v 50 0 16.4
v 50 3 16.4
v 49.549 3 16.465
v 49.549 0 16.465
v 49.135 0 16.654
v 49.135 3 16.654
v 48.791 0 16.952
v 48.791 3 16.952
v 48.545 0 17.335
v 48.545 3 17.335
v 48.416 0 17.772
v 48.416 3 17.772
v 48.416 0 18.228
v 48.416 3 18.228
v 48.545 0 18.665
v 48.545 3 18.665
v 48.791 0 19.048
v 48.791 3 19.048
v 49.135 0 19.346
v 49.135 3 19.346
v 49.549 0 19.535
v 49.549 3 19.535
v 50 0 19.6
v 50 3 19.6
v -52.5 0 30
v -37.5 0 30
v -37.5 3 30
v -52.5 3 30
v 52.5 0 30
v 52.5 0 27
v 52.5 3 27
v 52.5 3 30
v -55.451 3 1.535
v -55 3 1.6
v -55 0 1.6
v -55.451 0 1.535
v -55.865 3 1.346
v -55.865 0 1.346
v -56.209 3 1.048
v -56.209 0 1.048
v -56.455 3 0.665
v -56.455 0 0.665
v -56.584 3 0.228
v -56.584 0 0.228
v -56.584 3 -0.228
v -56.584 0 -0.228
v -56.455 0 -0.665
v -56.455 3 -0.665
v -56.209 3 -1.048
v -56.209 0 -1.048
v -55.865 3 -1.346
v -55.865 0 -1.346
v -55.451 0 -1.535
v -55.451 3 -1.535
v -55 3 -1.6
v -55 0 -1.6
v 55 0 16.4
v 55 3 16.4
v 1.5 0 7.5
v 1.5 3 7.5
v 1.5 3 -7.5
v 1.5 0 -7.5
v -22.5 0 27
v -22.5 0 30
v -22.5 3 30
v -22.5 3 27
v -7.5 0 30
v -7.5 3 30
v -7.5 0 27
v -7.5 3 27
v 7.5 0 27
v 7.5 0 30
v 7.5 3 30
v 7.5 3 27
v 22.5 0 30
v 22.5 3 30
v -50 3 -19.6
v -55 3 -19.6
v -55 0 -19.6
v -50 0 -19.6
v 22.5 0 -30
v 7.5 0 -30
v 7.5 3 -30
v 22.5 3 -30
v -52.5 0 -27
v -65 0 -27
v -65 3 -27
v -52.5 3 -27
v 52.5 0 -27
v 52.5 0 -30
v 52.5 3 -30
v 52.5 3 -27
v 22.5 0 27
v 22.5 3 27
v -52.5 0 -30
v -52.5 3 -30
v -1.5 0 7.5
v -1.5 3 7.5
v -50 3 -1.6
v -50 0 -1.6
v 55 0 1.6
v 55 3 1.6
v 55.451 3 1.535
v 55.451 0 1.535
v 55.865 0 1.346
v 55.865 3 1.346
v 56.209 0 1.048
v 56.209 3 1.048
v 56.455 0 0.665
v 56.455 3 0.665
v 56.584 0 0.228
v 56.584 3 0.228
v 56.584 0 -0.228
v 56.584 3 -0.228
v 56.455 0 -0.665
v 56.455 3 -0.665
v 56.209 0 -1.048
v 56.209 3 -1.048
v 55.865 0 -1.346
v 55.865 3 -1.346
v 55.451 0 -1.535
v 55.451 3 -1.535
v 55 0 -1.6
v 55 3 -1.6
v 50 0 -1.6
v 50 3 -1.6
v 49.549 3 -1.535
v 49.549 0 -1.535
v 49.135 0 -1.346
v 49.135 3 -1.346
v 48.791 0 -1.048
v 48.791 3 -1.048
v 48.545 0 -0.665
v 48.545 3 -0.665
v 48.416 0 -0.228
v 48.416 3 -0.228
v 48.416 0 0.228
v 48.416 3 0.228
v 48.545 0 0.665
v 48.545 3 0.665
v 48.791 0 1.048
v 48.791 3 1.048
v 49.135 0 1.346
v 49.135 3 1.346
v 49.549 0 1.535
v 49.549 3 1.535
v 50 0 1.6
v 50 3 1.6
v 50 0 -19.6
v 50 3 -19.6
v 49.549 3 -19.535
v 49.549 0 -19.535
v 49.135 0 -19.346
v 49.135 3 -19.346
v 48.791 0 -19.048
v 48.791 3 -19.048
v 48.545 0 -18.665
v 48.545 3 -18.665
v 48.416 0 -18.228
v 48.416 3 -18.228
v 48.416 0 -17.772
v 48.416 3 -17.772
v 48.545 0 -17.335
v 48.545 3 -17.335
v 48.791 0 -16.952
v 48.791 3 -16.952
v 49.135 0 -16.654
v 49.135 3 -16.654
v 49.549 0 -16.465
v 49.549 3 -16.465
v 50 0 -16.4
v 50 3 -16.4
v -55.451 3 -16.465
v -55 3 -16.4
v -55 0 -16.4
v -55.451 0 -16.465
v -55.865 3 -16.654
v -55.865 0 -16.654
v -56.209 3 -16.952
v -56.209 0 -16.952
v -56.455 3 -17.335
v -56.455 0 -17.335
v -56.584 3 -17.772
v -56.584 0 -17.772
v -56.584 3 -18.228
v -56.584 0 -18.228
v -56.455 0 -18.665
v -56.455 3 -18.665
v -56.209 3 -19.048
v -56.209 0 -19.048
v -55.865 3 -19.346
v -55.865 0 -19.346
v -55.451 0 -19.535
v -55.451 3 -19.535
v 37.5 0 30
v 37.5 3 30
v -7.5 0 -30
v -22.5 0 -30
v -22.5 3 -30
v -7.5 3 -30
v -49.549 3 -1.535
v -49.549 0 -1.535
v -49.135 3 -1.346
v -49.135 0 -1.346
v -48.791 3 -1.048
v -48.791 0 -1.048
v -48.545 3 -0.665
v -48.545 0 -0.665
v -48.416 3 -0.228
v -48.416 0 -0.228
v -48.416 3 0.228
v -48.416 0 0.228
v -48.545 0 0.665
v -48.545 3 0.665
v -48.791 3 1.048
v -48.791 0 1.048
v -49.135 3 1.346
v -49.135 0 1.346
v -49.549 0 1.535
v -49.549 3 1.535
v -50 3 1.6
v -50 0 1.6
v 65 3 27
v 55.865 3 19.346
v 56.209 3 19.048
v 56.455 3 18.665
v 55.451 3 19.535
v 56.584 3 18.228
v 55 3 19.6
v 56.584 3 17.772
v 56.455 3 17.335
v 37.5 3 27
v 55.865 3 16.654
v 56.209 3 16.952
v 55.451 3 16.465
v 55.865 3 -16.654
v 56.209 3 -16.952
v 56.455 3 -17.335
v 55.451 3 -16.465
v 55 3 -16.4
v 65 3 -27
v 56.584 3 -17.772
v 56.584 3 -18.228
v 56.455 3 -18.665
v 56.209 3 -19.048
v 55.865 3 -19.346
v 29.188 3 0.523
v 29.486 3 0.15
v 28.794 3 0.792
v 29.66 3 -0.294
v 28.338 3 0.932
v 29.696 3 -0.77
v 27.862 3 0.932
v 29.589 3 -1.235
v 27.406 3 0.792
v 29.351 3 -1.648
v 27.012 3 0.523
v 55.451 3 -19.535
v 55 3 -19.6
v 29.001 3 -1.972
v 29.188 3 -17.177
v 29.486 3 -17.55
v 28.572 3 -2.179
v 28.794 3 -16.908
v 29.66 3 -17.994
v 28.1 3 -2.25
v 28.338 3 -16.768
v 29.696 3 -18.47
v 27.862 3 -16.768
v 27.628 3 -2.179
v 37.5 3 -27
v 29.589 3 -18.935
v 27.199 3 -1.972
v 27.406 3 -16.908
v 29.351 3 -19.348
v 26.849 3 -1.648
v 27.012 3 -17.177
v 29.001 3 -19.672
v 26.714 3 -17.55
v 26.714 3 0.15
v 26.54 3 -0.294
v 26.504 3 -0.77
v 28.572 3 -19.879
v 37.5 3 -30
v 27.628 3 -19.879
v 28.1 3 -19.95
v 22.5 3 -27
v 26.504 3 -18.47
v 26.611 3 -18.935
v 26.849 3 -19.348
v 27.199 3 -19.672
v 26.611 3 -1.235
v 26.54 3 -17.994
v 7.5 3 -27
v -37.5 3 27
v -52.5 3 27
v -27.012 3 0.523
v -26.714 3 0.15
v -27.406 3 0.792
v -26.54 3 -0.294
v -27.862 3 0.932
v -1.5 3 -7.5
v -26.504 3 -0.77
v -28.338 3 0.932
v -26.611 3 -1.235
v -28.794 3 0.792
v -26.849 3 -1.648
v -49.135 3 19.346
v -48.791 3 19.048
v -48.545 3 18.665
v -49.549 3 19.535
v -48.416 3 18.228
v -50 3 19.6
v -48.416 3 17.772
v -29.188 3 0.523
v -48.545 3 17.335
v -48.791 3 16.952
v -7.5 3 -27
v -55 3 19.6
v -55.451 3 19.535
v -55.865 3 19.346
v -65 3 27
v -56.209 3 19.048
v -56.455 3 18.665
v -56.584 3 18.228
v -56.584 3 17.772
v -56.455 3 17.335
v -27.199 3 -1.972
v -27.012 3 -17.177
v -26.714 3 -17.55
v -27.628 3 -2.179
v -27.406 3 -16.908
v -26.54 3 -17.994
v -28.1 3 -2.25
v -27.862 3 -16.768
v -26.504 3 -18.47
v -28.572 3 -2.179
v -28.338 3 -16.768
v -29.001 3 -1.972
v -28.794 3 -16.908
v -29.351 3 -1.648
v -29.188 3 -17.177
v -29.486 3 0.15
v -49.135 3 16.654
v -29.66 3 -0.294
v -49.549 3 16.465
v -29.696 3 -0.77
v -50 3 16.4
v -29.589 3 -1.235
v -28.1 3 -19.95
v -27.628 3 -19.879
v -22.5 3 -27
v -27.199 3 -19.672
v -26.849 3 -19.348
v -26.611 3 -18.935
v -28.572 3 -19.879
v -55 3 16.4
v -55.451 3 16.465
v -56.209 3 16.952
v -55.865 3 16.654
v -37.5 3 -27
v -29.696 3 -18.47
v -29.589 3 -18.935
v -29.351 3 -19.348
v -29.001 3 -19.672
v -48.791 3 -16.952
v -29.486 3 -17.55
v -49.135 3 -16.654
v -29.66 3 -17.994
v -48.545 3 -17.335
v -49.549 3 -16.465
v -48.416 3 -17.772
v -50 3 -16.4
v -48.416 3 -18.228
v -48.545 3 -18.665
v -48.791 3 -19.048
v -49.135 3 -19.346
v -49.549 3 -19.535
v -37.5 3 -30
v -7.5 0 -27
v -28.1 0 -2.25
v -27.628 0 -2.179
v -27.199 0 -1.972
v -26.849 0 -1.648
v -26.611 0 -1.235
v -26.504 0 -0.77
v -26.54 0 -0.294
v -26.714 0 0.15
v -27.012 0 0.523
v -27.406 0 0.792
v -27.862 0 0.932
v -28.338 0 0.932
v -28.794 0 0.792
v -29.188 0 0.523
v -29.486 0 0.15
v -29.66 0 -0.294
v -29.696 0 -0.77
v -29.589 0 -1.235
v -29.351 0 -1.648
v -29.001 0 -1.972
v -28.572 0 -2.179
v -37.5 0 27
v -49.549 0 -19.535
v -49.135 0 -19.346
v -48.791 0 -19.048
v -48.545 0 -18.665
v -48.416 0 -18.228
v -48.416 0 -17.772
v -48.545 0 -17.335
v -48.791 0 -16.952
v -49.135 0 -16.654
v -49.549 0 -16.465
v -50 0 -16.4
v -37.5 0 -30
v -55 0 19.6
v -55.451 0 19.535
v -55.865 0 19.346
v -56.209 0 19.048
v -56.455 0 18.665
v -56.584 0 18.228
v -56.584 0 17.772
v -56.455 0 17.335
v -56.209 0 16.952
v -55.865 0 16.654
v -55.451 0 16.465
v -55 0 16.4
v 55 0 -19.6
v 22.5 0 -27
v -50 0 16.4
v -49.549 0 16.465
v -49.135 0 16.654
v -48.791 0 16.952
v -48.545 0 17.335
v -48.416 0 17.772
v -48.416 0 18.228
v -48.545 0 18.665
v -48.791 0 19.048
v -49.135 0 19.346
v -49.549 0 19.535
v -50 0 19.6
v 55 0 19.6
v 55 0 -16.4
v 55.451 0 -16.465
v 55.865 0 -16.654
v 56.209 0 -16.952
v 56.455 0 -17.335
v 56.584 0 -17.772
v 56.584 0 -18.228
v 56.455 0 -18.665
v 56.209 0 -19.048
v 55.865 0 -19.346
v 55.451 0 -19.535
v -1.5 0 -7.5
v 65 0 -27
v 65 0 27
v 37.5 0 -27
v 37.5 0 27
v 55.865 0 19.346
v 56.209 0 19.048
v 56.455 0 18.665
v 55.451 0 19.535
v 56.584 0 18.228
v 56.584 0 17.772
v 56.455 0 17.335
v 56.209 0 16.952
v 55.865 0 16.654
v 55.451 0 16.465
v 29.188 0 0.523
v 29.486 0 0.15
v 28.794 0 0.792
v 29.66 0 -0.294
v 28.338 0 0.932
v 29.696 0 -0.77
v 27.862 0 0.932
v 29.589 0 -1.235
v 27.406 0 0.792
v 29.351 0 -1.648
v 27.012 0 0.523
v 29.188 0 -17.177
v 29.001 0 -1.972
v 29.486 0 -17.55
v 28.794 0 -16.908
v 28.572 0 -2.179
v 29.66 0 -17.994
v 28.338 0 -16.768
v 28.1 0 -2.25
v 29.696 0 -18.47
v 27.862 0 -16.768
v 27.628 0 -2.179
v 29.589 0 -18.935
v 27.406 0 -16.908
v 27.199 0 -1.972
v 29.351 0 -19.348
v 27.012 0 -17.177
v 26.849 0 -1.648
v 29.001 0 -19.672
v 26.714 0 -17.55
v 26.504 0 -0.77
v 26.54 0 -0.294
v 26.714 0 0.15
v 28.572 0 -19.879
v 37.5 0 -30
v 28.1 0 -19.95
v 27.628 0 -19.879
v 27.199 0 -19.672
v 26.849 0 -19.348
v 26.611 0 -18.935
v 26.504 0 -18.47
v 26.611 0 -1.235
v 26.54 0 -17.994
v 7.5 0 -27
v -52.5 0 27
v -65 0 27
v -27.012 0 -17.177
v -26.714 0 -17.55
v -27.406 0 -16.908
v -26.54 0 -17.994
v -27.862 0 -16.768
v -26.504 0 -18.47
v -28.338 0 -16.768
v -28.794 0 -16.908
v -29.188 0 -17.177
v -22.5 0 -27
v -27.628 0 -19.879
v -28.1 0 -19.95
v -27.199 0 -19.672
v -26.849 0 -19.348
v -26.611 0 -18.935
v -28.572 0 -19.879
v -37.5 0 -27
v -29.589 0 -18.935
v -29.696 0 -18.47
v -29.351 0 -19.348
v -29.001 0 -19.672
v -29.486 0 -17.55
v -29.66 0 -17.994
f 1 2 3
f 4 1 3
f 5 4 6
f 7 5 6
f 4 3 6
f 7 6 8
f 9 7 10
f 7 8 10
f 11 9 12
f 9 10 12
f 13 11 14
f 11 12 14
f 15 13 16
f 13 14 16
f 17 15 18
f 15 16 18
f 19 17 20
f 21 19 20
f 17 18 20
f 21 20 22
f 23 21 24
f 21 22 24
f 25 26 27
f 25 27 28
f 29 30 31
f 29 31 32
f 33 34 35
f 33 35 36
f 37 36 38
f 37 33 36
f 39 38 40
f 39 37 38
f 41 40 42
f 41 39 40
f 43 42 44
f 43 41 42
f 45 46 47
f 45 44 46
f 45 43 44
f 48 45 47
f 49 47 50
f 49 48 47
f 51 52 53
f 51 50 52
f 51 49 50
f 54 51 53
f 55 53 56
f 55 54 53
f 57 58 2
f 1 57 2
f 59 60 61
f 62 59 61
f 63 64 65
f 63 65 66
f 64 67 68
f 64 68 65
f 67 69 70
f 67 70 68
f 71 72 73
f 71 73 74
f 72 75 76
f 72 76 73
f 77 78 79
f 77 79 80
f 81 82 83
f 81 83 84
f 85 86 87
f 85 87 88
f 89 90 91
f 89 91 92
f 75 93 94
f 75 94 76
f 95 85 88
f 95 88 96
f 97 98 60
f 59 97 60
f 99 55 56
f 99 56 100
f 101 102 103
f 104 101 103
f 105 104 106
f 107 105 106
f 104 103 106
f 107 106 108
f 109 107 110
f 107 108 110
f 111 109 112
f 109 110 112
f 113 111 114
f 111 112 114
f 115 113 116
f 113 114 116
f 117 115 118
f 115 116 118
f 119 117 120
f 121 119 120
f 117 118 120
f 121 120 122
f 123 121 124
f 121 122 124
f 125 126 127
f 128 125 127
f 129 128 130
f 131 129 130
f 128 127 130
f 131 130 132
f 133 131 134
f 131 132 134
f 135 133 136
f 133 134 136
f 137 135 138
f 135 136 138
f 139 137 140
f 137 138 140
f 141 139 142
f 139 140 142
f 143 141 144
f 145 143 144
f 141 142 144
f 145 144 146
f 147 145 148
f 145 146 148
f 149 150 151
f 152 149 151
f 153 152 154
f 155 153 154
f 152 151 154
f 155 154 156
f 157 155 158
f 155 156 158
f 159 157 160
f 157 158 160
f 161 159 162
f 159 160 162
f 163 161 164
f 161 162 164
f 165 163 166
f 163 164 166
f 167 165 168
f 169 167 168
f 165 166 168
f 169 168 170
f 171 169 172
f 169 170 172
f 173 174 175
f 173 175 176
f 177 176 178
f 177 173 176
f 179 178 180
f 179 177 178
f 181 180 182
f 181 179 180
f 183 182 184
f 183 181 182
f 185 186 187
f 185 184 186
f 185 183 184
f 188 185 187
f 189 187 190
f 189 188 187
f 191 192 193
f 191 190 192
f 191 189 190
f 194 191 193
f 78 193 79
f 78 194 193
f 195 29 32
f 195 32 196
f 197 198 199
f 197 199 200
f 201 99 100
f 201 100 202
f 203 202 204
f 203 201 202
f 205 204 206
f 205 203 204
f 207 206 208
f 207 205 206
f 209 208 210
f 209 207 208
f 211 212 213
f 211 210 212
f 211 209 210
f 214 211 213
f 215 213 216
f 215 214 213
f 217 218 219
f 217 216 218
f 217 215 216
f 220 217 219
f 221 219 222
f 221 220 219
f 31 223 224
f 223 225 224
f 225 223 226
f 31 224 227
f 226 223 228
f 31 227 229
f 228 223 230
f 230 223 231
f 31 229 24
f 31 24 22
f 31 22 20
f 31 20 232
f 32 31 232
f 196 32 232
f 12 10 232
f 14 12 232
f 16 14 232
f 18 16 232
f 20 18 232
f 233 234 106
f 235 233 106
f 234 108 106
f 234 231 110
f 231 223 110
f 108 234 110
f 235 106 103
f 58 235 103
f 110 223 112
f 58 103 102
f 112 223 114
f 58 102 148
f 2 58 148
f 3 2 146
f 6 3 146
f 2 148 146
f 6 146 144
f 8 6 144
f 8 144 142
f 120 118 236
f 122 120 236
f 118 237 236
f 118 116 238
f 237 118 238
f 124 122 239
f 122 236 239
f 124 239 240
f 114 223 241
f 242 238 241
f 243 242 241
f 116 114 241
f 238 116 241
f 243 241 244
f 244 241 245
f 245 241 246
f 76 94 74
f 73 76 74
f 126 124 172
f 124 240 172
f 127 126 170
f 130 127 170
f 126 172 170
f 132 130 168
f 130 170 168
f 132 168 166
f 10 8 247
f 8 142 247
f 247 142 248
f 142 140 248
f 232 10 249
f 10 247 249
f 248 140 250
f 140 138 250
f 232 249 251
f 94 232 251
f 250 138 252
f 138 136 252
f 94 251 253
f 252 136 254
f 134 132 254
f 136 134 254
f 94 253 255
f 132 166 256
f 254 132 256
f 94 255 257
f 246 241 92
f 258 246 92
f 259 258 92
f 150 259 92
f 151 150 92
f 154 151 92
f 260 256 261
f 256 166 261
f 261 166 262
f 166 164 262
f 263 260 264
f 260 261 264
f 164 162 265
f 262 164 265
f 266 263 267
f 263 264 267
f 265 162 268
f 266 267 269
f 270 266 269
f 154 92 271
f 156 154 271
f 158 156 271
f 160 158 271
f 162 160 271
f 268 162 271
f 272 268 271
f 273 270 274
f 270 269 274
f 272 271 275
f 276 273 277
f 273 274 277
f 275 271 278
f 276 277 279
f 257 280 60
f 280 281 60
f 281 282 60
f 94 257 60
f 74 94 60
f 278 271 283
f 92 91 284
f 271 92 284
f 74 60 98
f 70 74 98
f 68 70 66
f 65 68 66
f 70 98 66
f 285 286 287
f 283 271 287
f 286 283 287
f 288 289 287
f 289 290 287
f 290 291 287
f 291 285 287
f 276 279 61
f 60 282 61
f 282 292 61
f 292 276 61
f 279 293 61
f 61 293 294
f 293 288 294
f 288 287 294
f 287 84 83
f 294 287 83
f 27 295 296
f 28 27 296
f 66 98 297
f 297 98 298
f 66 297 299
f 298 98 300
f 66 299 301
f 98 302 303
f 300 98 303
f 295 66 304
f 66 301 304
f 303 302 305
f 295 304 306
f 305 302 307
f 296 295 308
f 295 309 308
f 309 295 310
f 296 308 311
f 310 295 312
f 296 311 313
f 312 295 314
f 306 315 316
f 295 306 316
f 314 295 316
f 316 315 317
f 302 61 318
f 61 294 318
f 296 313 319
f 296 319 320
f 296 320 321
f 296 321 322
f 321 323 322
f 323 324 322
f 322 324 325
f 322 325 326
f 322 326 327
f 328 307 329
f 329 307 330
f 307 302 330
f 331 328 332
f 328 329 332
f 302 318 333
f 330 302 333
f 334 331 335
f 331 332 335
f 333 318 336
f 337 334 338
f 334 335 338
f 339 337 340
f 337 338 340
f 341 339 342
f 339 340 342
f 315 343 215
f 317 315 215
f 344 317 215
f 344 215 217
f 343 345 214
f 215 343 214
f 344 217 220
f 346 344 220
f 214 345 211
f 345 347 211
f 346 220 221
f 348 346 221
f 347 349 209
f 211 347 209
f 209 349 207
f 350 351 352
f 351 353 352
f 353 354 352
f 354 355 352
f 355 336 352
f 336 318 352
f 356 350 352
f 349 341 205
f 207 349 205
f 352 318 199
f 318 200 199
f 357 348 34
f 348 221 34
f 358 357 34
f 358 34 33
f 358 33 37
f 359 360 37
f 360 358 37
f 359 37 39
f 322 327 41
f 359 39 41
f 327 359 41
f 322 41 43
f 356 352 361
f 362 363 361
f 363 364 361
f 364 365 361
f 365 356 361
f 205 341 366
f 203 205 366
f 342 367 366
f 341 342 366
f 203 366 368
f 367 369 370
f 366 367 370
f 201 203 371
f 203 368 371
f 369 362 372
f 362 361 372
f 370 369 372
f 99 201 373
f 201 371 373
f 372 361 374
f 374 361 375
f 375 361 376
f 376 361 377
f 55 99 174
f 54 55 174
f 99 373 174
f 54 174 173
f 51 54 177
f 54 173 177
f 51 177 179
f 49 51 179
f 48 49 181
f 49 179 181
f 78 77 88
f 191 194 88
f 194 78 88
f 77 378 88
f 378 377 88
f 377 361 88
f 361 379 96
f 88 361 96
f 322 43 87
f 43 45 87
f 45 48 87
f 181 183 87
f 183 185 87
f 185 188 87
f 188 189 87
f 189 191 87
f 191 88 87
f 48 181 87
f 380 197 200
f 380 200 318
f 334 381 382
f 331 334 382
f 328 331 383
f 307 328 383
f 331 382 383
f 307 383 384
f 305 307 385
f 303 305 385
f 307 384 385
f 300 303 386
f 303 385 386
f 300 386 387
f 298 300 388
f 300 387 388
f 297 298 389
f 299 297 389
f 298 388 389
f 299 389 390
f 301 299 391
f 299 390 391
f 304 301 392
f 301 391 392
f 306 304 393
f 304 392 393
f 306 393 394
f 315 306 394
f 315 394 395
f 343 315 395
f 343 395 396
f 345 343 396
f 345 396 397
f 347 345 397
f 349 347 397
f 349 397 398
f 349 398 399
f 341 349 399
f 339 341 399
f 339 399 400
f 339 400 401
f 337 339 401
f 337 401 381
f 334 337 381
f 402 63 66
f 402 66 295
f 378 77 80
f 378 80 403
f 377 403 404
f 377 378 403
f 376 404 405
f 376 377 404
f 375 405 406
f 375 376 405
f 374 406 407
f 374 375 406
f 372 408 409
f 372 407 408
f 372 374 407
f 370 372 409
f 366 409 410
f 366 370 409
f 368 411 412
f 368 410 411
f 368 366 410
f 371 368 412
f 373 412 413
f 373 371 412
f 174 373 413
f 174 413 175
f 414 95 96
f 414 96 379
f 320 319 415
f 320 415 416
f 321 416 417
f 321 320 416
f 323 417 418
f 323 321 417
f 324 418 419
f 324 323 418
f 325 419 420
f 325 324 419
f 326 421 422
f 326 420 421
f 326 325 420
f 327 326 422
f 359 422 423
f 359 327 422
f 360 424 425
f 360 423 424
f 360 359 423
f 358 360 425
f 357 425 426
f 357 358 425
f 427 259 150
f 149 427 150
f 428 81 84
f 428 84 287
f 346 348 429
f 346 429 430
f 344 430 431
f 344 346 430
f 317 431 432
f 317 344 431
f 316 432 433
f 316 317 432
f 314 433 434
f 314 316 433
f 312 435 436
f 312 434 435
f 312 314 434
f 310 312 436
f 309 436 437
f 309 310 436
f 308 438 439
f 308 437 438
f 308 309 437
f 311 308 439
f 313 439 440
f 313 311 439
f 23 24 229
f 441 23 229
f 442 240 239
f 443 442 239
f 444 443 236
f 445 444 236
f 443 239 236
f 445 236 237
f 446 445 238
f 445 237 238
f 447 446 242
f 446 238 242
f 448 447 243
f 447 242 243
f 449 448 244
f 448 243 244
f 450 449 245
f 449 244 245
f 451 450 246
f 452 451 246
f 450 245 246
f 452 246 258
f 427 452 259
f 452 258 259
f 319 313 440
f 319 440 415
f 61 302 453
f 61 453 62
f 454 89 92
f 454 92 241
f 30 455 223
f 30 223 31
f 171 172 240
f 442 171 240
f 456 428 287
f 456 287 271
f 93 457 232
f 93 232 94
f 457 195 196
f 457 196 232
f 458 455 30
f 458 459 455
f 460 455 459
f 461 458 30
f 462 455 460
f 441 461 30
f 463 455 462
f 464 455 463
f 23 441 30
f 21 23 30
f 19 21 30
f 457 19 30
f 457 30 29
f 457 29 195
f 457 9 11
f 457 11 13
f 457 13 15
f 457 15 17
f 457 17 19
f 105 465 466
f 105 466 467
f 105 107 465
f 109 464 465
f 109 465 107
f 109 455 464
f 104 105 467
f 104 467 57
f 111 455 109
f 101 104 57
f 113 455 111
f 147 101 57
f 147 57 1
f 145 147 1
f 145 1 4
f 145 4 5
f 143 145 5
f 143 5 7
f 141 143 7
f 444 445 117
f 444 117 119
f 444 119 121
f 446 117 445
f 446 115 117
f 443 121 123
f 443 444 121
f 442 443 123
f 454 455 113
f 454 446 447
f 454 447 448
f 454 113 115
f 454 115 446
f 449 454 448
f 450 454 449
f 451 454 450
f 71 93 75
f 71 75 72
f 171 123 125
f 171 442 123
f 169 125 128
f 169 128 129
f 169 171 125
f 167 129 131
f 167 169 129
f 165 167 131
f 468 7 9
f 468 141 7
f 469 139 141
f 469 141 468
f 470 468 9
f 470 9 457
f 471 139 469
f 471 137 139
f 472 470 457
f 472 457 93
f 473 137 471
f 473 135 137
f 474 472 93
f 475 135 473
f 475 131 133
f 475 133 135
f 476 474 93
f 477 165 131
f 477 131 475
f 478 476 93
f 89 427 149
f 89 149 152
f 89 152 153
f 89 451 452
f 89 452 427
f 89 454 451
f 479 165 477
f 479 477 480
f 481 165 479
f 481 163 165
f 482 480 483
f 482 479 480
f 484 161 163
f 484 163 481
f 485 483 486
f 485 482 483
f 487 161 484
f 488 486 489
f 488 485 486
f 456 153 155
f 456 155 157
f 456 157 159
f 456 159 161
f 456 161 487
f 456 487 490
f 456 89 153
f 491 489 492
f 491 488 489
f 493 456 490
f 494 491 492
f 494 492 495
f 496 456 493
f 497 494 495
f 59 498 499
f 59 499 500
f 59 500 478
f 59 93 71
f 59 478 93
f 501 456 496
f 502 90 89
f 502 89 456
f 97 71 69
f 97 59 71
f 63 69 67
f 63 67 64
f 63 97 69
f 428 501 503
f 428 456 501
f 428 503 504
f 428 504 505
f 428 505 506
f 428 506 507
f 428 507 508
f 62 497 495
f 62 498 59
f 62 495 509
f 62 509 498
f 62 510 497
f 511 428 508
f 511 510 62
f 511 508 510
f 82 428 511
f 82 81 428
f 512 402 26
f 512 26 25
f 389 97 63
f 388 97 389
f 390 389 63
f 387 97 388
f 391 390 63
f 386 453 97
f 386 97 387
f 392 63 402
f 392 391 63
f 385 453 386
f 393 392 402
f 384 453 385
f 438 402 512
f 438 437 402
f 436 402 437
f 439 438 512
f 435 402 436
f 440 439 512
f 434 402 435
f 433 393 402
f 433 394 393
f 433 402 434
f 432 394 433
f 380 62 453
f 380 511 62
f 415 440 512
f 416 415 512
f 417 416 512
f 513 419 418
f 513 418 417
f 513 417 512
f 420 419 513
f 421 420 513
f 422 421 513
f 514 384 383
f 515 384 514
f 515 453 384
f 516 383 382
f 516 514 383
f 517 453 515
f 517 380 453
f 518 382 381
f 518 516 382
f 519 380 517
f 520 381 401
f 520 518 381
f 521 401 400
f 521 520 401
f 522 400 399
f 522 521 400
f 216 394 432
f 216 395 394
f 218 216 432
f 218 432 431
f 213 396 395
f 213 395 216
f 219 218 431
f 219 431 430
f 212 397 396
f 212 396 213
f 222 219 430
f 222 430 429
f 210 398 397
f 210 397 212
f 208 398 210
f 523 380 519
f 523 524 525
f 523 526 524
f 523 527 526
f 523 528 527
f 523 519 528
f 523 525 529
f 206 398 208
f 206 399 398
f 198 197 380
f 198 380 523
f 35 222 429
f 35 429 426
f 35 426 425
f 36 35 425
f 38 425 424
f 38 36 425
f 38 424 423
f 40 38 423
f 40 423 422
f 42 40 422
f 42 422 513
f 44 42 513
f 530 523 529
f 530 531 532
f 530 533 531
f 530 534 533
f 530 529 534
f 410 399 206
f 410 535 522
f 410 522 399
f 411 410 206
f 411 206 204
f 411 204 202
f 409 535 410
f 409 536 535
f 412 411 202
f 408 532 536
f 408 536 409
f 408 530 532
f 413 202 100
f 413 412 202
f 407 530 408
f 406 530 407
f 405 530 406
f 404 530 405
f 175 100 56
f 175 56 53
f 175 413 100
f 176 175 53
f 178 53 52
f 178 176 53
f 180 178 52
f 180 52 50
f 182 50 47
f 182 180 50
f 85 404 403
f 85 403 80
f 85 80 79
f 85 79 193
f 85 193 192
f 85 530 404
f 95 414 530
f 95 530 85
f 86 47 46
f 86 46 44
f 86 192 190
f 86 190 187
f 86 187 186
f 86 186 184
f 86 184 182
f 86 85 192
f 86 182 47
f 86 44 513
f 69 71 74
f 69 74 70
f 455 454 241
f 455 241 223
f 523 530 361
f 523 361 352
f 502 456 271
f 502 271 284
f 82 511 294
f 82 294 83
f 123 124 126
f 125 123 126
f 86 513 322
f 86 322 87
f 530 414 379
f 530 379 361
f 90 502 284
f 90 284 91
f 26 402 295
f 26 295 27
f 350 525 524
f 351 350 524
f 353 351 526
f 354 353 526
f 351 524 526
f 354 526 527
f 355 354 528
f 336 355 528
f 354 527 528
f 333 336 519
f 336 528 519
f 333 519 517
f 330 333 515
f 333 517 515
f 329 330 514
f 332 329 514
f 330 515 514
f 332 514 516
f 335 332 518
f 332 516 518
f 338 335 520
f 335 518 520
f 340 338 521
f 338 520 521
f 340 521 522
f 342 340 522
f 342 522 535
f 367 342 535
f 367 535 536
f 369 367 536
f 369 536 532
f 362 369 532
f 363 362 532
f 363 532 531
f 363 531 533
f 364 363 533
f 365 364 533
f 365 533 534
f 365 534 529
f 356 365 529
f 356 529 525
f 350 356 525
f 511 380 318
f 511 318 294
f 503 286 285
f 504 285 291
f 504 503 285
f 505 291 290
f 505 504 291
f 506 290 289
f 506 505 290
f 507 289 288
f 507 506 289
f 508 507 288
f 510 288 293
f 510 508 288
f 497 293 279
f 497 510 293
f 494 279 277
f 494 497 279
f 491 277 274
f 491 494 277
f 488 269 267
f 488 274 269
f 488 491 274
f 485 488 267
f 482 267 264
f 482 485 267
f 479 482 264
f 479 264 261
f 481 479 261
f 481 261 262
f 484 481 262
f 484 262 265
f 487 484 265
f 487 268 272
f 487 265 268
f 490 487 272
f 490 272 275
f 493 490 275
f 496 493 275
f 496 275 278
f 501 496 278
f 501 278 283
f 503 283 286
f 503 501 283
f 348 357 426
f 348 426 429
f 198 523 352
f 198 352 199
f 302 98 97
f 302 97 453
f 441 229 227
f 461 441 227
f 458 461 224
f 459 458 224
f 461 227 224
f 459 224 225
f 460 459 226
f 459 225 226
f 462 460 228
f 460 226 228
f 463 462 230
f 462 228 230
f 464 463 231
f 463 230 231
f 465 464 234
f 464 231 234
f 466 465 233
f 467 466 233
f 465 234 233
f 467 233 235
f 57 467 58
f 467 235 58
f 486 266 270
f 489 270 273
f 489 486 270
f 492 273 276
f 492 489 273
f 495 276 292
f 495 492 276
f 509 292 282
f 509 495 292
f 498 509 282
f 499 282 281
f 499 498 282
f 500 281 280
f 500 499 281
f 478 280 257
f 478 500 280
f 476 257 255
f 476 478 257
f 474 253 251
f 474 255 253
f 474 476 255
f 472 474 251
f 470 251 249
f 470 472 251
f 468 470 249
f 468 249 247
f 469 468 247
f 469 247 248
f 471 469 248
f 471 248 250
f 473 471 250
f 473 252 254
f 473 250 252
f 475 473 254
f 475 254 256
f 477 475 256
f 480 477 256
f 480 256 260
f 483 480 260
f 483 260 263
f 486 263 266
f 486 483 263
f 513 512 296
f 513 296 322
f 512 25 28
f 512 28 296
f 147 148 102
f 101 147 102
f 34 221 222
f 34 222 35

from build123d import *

# Parameters (mm, degrees)
BOSS_EXTRUDE1_DEPTH = 3
CUT_EXTRUDE1_DEPTH  = 72.651936471
SKETCH3_W           = 3
SKETCH3_H           = 15
CUT_EXTRUDE2_DEPTH  = 72.651936471
SKETCH4_R           = 1.6
CUT_EXTRUDE3_DEPTH  = 72.651936471


with BuildPart() as part:
    # Sketch1 → Boss-Extrude1 (new body)
    with BuildSketch(Plane(origin=(0, 0, 0), x_dir=(1, 0, 0), z_dir=(0, 1, 0))):
        Polygon((-65, 27), (-52.5, 27), (-52.5, 30), (-37.5, 30), (-37.5, 27), (-22.5, 27), (-22.5, 30), (-7.5, 30), (-7.5, 27), (7.5, 27), (7.5, 30), (22.5, 30), (22.5, 27), (37.5, 27), (37.5, 30), (52.5, 30), (52.5, 27), (65, 27), (65, -27), (52.5, -27), (52.5, -30), (37.5, -30), (37.5, -27), (22.5, -27), (22.5, -30), (7.5, -30), (7.5, -27), (-7.5, -27), (-7.5, -30), (-22.5, -30), (-22.5, -27), (-37.5, -27), (-37.5, -30), (-52.5, -30), (-52.5, -27), (-65, -27), align=None)
    extrude(amount=BOSS_EXTRUDE1_DEPTH)

    # Sketch2 → Cut-Extrude1 (cut, through all)
    with BuildSketch(Plane(origin=(0, 3, 0), x_dir=(1, 0, 0), z_dir=(0, 1, 0))):
        with BuildLine():
            Line((-55, 1.6), (-50, 1.6))
            ThreePointArc((-50, 1.6), (-48.4, 0), (-50, -1.6))
            Line((-50, -1.6), (-55, -1.6))
            ThreePointArc((-55, -1.6), (-56.6, 0), (-55, 1.6))
        make_face()
        with BuildLine():
            Line((55, 1.6), (50, 1.6))
            ThreePointArc((50, 1.6), (48.4, 0), (50, -1.6))
            Line((50, -1.6), (55, -1.6))
            ThreePointArc((55, -1.6), (56.6, 0), (55, 1.6))
        make_face()
        with BuildLine():
            Line((-55, 19.6), (-50, 19.6))
            ThreePointArc((-50, 19.6), (-48.4, 18), (-50, 16.4))
            Line((-50, 16.4), (-55, 16.4))
            ThreePointArc((-55, 16.4), (-56.6, 18), (-55, 19.6))
        make_face()
        with BuildLine():
            Line((-55, -16.4), (-50, -16.4))
            ThreePointArc((-50, -16.4), (-48.4, -18), (-50, -19.6))
            Line((-50, -19.6), (-55, -19.6))
            ThreePointArc((-55, -19.6), (-56.6, -18), (-55, -16.4))
        make_face()
        with BuildLine():
            Line((55, 19.6), (50, 19.6))
            ThreePointArc((50, 19.6), (48.4, 18), (50, 16.4))
            Line((50, 16.4), (55, 16.4))
            ThreePointArc((55, 16.4), (56.6, 18), (55, 19.6))
        make_face()
        with BuildLine():
            Line((55, -16.4), (50, -16.4))
            ThreePointArc((50, -16.4), (48.4, -18), (50, -19.6))
            Line((50, -19.6), (55, -19.6))
            ThreePointArc((55, -19.6), (56.6, -18), (55, -16.4))
        make_face()
    extrude(amount=-CUT_EXTRUDE1_DEPTH, mode=Mode.SUBTRACT)

    # Sketch3 → Cut-Extrude2 (cut, through all)
    with BuildSketch(Plane(origin=(0, 3, 0), x_dir=(1, 0, 0), z_dir=(0, 1, 0))):
        Rectangle(SKETCH3_W, SKETCH3_H)
    extrude(amount=-CUT_EXTRUDE2_DEPTH, mode=Mode.SUBTRACT)

    # Sketch4 → Cut-Extrude3 (cut, through all)
    with BuildSketch(Plane.XZ):
        with Locations(Location((-28.1, -0.65, 0), (0, 0, 270))):
            Circle(SKETCH4_R)
        with Locations(Location((-28.1, -18.35, 0), (0, 0, 270))):
            Circle(SKETCH4_R)
    cut_extrude3 = extrude(amount=-CUT_EXTRUDE3_DEPTH, mode=Mode.SUBTRACT)

    # Mirror1: Cut-Extrude3 across plane
    add(cut_extrude3.mirror(Plane(origin=(0, 0, 0), x_dir=(0, 0, 1), z_dir=(1, 0, 0))), mode=Mode.SUBTRACT)


solid = part.part
